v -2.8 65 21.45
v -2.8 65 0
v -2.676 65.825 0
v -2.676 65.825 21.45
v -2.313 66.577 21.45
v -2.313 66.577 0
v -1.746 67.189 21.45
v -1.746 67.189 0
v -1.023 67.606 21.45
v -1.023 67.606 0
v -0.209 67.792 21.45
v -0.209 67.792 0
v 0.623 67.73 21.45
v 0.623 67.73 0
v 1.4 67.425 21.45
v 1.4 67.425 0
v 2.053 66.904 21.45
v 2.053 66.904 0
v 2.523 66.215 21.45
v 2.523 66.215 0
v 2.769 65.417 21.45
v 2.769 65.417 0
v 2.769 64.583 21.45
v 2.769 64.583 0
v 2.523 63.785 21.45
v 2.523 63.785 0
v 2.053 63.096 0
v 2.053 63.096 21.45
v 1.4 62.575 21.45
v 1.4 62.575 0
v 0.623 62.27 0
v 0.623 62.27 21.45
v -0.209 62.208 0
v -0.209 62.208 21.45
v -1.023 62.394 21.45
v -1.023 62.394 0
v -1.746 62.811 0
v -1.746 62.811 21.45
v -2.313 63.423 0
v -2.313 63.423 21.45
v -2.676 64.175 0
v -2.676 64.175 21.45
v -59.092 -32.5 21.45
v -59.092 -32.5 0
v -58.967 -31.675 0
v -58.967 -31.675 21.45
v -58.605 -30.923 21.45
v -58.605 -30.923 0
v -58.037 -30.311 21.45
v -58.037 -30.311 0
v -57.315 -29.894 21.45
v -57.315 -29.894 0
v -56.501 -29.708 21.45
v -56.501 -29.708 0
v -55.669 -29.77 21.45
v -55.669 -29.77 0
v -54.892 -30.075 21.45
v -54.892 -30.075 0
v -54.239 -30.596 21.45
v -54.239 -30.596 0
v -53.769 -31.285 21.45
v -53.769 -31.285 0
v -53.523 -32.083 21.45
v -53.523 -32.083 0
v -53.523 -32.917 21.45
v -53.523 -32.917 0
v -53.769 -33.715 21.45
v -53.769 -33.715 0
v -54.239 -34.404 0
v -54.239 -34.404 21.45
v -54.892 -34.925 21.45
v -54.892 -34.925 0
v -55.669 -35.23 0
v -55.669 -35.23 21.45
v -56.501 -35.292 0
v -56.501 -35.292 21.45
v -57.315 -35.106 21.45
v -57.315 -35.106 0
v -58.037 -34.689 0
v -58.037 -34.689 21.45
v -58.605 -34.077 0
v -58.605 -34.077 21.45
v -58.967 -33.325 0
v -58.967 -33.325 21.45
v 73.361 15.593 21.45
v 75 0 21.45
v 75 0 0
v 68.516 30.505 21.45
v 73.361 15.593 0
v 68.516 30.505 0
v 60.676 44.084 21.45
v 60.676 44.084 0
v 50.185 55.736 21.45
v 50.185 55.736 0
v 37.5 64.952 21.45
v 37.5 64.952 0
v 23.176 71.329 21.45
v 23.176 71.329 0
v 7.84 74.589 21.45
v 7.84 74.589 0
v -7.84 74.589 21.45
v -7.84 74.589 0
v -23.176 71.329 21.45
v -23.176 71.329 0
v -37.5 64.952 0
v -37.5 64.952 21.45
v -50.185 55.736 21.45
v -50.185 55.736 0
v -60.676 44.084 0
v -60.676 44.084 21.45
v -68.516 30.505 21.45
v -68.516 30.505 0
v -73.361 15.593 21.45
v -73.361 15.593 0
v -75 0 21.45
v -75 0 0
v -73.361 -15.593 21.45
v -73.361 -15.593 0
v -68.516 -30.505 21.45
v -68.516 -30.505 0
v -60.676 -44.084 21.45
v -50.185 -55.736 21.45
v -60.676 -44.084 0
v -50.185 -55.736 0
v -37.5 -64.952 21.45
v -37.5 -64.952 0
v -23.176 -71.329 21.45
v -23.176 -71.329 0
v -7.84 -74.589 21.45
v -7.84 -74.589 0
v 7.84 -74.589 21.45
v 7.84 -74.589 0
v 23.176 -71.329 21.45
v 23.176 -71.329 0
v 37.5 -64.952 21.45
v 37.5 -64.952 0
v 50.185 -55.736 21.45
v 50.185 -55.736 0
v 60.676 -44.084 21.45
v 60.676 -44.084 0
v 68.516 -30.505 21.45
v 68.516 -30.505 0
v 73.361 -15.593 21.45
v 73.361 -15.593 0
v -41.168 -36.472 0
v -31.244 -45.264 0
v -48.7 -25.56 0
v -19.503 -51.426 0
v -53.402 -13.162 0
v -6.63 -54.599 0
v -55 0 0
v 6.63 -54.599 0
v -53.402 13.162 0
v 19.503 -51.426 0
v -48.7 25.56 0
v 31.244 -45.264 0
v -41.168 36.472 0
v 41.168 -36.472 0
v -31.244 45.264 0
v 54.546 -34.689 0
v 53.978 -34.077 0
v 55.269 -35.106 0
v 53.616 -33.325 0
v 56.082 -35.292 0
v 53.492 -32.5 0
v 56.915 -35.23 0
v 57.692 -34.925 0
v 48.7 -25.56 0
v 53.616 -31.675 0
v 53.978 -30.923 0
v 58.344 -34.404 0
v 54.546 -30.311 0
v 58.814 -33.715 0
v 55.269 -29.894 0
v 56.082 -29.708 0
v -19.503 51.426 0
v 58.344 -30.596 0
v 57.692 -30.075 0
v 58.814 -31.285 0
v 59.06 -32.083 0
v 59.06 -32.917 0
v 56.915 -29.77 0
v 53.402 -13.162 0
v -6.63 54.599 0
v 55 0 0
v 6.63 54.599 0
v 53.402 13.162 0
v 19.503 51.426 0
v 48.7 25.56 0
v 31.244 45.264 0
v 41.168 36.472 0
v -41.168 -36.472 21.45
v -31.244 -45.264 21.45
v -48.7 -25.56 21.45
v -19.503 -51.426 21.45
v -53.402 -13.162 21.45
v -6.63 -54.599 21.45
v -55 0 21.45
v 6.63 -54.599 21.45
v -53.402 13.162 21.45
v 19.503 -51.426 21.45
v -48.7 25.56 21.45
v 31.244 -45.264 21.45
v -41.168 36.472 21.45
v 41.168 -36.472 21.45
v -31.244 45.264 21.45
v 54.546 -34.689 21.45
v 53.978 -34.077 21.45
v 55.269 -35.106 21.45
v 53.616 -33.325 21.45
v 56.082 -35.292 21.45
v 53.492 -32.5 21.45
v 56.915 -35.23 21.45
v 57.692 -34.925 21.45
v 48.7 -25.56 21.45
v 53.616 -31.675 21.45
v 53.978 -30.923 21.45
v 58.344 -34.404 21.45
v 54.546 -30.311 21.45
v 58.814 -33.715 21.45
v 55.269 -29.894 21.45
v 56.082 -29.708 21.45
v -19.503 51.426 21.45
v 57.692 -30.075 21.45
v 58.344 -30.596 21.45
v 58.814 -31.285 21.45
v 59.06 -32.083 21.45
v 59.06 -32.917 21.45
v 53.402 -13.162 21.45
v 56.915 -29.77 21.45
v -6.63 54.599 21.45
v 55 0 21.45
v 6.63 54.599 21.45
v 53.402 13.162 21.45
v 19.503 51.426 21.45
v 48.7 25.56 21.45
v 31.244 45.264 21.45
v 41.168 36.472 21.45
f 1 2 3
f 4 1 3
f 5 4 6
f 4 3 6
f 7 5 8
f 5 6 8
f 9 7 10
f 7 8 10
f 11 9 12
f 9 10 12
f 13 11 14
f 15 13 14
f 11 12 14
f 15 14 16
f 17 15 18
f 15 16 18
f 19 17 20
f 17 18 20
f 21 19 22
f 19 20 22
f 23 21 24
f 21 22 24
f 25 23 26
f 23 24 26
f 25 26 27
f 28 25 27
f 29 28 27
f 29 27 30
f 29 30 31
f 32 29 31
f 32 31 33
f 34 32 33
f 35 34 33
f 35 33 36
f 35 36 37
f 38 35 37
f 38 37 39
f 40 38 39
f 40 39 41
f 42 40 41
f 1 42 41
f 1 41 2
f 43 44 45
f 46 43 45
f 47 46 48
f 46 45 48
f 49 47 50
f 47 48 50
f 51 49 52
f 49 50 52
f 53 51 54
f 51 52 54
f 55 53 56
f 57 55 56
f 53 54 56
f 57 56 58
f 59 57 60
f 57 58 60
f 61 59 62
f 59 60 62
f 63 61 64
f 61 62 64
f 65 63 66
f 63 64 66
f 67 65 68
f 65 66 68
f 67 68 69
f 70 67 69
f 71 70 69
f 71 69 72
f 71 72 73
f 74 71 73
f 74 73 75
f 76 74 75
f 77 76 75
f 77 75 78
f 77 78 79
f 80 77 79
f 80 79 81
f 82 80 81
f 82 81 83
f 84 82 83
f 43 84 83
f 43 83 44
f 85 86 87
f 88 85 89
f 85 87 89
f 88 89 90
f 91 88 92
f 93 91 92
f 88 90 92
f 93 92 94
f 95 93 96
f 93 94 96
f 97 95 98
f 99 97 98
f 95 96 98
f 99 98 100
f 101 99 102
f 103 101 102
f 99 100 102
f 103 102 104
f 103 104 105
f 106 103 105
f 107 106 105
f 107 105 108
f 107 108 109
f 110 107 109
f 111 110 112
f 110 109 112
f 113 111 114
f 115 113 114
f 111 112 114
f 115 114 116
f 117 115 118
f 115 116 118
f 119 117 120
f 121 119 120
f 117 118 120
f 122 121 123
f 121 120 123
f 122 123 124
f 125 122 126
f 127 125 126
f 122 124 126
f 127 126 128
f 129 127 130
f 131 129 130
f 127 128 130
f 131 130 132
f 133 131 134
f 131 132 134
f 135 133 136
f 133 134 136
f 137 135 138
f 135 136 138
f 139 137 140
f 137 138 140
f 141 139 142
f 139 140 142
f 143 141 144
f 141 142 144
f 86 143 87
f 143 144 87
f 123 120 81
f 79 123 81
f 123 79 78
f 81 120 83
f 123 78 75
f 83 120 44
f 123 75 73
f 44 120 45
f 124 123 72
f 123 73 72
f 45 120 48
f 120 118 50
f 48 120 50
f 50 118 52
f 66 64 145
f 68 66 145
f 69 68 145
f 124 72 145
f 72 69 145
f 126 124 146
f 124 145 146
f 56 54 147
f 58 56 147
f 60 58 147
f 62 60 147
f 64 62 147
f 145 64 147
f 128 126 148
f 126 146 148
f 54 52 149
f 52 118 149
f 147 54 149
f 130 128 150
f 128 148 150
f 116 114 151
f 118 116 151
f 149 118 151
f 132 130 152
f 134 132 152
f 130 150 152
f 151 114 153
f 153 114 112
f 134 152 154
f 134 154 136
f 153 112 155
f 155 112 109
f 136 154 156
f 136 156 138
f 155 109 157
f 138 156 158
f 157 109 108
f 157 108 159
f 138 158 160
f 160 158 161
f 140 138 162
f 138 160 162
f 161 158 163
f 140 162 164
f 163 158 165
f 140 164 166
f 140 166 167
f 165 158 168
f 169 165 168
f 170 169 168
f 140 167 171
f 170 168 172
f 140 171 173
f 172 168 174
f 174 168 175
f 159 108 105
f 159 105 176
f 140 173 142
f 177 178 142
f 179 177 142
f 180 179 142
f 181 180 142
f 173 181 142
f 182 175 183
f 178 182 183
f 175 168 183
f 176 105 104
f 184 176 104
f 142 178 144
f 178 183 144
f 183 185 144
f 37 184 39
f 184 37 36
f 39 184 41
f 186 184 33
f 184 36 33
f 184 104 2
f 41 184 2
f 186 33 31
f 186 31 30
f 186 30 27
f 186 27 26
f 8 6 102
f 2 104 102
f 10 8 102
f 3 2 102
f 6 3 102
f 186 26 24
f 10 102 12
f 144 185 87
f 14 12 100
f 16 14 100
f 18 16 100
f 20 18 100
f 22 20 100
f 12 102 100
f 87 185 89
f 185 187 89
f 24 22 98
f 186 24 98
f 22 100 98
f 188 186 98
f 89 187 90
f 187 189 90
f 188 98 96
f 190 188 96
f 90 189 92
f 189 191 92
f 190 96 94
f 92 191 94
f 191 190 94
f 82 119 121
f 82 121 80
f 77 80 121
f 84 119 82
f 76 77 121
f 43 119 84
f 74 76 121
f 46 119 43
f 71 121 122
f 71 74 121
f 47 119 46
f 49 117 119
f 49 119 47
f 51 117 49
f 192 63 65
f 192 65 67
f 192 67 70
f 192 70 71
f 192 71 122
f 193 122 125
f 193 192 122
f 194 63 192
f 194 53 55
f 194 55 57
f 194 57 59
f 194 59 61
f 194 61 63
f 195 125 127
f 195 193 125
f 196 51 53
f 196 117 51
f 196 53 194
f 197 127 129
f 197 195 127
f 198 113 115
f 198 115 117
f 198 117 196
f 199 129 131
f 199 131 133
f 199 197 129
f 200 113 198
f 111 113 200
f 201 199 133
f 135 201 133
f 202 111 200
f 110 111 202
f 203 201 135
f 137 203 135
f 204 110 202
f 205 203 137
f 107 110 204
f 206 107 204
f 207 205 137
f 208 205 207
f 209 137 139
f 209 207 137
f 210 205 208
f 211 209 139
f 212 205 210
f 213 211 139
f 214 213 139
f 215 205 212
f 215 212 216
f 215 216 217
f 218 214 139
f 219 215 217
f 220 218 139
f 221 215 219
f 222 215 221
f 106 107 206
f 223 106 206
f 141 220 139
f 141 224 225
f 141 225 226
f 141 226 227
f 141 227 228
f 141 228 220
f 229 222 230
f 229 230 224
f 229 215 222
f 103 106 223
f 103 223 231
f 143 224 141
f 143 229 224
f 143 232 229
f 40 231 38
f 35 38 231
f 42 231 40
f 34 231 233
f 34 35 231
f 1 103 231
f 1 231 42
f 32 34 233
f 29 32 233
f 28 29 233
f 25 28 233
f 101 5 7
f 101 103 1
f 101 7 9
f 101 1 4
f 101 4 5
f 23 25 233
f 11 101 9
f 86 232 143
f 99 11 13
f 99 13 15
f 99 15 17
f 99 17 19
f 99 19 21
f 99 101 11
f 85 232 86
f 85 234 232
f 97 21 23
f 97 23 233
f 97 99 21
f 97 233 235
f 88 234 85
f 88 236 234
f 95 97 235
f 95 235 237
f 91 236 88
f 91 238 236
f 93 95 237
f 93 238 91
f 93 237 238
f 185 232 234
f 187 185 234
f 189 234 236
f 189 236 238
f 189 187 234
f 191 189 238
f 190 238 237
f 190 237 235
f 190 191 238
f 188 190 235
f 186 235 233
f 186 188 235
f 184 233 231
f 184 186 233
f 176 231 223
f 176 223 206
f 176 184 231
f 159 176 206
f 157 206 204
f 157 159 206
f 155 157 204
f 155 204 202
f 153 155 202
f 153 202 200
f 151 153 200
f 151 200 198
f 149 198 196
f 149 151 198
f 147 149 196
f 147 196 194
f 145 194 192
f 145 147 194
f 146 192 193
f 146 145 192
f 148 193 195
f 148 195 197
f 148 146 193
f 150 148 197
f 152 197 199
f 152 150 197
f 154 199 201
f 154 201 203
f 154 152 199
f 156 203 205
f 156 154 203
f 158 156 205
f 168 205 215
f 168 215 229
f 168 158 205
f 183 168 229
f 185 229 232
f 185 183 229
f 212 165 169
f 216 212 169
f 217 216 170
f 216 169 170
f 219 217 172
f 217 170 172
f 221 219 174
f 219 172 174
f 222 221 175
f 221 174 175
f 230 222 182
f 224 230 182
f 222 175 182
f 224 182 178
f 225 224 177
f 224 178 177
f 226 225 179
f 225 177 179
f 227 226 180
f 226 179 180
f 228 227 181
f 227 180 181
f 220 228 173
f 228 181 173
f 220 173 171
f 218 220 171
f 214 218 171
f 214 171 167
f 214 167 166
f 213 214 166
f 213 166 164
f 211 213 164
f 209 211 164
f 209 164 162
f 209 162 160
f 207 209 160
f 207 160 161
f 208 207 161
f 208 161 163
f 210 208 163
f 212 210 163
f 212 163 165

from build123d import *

# Parameters (mm, degrees)
SKETCH1_R           = 75
SKETCH1_R_2         = 55
BOSS_EXTRUDE1_DEPTH = 21.45
SKETCH3_R           = 2.8
CUT_EXTRUDE1_DEPTH  = 27.8


with BuildPart() as part:
    # Sketch1 → Boss-Extrude1 (new body)
    with BuildSketch(Plane.XY):
        Circle(SKETCH1_R)
        Circle(SKETCH1_R_2, mode=Mode.SUBTRACT)
    extrude(amount=BOSS_EXTRUDE1_DEPTH)

    # Sketch3 → Cut-Extrude1 (cut)
    with BuildSketch(Plane(origin=(0, 0, 0), x_dir=(-1, 0, 0), z_dir=(0, 0, -1))):
        with Locations((0, 65)):
            Circle(SKETCH3_R)
        with Locations((56.291651246, -32.5)):
            Circle(SKETCH3_R)
        with Locations((-56.291651246, -32.5)):
            Circle(SKETCH3_R)
    extrude(amount=-CUT_EXTRUDE1_DEPTH, mode=Mode.SUBTRACT)


solid = part.part
